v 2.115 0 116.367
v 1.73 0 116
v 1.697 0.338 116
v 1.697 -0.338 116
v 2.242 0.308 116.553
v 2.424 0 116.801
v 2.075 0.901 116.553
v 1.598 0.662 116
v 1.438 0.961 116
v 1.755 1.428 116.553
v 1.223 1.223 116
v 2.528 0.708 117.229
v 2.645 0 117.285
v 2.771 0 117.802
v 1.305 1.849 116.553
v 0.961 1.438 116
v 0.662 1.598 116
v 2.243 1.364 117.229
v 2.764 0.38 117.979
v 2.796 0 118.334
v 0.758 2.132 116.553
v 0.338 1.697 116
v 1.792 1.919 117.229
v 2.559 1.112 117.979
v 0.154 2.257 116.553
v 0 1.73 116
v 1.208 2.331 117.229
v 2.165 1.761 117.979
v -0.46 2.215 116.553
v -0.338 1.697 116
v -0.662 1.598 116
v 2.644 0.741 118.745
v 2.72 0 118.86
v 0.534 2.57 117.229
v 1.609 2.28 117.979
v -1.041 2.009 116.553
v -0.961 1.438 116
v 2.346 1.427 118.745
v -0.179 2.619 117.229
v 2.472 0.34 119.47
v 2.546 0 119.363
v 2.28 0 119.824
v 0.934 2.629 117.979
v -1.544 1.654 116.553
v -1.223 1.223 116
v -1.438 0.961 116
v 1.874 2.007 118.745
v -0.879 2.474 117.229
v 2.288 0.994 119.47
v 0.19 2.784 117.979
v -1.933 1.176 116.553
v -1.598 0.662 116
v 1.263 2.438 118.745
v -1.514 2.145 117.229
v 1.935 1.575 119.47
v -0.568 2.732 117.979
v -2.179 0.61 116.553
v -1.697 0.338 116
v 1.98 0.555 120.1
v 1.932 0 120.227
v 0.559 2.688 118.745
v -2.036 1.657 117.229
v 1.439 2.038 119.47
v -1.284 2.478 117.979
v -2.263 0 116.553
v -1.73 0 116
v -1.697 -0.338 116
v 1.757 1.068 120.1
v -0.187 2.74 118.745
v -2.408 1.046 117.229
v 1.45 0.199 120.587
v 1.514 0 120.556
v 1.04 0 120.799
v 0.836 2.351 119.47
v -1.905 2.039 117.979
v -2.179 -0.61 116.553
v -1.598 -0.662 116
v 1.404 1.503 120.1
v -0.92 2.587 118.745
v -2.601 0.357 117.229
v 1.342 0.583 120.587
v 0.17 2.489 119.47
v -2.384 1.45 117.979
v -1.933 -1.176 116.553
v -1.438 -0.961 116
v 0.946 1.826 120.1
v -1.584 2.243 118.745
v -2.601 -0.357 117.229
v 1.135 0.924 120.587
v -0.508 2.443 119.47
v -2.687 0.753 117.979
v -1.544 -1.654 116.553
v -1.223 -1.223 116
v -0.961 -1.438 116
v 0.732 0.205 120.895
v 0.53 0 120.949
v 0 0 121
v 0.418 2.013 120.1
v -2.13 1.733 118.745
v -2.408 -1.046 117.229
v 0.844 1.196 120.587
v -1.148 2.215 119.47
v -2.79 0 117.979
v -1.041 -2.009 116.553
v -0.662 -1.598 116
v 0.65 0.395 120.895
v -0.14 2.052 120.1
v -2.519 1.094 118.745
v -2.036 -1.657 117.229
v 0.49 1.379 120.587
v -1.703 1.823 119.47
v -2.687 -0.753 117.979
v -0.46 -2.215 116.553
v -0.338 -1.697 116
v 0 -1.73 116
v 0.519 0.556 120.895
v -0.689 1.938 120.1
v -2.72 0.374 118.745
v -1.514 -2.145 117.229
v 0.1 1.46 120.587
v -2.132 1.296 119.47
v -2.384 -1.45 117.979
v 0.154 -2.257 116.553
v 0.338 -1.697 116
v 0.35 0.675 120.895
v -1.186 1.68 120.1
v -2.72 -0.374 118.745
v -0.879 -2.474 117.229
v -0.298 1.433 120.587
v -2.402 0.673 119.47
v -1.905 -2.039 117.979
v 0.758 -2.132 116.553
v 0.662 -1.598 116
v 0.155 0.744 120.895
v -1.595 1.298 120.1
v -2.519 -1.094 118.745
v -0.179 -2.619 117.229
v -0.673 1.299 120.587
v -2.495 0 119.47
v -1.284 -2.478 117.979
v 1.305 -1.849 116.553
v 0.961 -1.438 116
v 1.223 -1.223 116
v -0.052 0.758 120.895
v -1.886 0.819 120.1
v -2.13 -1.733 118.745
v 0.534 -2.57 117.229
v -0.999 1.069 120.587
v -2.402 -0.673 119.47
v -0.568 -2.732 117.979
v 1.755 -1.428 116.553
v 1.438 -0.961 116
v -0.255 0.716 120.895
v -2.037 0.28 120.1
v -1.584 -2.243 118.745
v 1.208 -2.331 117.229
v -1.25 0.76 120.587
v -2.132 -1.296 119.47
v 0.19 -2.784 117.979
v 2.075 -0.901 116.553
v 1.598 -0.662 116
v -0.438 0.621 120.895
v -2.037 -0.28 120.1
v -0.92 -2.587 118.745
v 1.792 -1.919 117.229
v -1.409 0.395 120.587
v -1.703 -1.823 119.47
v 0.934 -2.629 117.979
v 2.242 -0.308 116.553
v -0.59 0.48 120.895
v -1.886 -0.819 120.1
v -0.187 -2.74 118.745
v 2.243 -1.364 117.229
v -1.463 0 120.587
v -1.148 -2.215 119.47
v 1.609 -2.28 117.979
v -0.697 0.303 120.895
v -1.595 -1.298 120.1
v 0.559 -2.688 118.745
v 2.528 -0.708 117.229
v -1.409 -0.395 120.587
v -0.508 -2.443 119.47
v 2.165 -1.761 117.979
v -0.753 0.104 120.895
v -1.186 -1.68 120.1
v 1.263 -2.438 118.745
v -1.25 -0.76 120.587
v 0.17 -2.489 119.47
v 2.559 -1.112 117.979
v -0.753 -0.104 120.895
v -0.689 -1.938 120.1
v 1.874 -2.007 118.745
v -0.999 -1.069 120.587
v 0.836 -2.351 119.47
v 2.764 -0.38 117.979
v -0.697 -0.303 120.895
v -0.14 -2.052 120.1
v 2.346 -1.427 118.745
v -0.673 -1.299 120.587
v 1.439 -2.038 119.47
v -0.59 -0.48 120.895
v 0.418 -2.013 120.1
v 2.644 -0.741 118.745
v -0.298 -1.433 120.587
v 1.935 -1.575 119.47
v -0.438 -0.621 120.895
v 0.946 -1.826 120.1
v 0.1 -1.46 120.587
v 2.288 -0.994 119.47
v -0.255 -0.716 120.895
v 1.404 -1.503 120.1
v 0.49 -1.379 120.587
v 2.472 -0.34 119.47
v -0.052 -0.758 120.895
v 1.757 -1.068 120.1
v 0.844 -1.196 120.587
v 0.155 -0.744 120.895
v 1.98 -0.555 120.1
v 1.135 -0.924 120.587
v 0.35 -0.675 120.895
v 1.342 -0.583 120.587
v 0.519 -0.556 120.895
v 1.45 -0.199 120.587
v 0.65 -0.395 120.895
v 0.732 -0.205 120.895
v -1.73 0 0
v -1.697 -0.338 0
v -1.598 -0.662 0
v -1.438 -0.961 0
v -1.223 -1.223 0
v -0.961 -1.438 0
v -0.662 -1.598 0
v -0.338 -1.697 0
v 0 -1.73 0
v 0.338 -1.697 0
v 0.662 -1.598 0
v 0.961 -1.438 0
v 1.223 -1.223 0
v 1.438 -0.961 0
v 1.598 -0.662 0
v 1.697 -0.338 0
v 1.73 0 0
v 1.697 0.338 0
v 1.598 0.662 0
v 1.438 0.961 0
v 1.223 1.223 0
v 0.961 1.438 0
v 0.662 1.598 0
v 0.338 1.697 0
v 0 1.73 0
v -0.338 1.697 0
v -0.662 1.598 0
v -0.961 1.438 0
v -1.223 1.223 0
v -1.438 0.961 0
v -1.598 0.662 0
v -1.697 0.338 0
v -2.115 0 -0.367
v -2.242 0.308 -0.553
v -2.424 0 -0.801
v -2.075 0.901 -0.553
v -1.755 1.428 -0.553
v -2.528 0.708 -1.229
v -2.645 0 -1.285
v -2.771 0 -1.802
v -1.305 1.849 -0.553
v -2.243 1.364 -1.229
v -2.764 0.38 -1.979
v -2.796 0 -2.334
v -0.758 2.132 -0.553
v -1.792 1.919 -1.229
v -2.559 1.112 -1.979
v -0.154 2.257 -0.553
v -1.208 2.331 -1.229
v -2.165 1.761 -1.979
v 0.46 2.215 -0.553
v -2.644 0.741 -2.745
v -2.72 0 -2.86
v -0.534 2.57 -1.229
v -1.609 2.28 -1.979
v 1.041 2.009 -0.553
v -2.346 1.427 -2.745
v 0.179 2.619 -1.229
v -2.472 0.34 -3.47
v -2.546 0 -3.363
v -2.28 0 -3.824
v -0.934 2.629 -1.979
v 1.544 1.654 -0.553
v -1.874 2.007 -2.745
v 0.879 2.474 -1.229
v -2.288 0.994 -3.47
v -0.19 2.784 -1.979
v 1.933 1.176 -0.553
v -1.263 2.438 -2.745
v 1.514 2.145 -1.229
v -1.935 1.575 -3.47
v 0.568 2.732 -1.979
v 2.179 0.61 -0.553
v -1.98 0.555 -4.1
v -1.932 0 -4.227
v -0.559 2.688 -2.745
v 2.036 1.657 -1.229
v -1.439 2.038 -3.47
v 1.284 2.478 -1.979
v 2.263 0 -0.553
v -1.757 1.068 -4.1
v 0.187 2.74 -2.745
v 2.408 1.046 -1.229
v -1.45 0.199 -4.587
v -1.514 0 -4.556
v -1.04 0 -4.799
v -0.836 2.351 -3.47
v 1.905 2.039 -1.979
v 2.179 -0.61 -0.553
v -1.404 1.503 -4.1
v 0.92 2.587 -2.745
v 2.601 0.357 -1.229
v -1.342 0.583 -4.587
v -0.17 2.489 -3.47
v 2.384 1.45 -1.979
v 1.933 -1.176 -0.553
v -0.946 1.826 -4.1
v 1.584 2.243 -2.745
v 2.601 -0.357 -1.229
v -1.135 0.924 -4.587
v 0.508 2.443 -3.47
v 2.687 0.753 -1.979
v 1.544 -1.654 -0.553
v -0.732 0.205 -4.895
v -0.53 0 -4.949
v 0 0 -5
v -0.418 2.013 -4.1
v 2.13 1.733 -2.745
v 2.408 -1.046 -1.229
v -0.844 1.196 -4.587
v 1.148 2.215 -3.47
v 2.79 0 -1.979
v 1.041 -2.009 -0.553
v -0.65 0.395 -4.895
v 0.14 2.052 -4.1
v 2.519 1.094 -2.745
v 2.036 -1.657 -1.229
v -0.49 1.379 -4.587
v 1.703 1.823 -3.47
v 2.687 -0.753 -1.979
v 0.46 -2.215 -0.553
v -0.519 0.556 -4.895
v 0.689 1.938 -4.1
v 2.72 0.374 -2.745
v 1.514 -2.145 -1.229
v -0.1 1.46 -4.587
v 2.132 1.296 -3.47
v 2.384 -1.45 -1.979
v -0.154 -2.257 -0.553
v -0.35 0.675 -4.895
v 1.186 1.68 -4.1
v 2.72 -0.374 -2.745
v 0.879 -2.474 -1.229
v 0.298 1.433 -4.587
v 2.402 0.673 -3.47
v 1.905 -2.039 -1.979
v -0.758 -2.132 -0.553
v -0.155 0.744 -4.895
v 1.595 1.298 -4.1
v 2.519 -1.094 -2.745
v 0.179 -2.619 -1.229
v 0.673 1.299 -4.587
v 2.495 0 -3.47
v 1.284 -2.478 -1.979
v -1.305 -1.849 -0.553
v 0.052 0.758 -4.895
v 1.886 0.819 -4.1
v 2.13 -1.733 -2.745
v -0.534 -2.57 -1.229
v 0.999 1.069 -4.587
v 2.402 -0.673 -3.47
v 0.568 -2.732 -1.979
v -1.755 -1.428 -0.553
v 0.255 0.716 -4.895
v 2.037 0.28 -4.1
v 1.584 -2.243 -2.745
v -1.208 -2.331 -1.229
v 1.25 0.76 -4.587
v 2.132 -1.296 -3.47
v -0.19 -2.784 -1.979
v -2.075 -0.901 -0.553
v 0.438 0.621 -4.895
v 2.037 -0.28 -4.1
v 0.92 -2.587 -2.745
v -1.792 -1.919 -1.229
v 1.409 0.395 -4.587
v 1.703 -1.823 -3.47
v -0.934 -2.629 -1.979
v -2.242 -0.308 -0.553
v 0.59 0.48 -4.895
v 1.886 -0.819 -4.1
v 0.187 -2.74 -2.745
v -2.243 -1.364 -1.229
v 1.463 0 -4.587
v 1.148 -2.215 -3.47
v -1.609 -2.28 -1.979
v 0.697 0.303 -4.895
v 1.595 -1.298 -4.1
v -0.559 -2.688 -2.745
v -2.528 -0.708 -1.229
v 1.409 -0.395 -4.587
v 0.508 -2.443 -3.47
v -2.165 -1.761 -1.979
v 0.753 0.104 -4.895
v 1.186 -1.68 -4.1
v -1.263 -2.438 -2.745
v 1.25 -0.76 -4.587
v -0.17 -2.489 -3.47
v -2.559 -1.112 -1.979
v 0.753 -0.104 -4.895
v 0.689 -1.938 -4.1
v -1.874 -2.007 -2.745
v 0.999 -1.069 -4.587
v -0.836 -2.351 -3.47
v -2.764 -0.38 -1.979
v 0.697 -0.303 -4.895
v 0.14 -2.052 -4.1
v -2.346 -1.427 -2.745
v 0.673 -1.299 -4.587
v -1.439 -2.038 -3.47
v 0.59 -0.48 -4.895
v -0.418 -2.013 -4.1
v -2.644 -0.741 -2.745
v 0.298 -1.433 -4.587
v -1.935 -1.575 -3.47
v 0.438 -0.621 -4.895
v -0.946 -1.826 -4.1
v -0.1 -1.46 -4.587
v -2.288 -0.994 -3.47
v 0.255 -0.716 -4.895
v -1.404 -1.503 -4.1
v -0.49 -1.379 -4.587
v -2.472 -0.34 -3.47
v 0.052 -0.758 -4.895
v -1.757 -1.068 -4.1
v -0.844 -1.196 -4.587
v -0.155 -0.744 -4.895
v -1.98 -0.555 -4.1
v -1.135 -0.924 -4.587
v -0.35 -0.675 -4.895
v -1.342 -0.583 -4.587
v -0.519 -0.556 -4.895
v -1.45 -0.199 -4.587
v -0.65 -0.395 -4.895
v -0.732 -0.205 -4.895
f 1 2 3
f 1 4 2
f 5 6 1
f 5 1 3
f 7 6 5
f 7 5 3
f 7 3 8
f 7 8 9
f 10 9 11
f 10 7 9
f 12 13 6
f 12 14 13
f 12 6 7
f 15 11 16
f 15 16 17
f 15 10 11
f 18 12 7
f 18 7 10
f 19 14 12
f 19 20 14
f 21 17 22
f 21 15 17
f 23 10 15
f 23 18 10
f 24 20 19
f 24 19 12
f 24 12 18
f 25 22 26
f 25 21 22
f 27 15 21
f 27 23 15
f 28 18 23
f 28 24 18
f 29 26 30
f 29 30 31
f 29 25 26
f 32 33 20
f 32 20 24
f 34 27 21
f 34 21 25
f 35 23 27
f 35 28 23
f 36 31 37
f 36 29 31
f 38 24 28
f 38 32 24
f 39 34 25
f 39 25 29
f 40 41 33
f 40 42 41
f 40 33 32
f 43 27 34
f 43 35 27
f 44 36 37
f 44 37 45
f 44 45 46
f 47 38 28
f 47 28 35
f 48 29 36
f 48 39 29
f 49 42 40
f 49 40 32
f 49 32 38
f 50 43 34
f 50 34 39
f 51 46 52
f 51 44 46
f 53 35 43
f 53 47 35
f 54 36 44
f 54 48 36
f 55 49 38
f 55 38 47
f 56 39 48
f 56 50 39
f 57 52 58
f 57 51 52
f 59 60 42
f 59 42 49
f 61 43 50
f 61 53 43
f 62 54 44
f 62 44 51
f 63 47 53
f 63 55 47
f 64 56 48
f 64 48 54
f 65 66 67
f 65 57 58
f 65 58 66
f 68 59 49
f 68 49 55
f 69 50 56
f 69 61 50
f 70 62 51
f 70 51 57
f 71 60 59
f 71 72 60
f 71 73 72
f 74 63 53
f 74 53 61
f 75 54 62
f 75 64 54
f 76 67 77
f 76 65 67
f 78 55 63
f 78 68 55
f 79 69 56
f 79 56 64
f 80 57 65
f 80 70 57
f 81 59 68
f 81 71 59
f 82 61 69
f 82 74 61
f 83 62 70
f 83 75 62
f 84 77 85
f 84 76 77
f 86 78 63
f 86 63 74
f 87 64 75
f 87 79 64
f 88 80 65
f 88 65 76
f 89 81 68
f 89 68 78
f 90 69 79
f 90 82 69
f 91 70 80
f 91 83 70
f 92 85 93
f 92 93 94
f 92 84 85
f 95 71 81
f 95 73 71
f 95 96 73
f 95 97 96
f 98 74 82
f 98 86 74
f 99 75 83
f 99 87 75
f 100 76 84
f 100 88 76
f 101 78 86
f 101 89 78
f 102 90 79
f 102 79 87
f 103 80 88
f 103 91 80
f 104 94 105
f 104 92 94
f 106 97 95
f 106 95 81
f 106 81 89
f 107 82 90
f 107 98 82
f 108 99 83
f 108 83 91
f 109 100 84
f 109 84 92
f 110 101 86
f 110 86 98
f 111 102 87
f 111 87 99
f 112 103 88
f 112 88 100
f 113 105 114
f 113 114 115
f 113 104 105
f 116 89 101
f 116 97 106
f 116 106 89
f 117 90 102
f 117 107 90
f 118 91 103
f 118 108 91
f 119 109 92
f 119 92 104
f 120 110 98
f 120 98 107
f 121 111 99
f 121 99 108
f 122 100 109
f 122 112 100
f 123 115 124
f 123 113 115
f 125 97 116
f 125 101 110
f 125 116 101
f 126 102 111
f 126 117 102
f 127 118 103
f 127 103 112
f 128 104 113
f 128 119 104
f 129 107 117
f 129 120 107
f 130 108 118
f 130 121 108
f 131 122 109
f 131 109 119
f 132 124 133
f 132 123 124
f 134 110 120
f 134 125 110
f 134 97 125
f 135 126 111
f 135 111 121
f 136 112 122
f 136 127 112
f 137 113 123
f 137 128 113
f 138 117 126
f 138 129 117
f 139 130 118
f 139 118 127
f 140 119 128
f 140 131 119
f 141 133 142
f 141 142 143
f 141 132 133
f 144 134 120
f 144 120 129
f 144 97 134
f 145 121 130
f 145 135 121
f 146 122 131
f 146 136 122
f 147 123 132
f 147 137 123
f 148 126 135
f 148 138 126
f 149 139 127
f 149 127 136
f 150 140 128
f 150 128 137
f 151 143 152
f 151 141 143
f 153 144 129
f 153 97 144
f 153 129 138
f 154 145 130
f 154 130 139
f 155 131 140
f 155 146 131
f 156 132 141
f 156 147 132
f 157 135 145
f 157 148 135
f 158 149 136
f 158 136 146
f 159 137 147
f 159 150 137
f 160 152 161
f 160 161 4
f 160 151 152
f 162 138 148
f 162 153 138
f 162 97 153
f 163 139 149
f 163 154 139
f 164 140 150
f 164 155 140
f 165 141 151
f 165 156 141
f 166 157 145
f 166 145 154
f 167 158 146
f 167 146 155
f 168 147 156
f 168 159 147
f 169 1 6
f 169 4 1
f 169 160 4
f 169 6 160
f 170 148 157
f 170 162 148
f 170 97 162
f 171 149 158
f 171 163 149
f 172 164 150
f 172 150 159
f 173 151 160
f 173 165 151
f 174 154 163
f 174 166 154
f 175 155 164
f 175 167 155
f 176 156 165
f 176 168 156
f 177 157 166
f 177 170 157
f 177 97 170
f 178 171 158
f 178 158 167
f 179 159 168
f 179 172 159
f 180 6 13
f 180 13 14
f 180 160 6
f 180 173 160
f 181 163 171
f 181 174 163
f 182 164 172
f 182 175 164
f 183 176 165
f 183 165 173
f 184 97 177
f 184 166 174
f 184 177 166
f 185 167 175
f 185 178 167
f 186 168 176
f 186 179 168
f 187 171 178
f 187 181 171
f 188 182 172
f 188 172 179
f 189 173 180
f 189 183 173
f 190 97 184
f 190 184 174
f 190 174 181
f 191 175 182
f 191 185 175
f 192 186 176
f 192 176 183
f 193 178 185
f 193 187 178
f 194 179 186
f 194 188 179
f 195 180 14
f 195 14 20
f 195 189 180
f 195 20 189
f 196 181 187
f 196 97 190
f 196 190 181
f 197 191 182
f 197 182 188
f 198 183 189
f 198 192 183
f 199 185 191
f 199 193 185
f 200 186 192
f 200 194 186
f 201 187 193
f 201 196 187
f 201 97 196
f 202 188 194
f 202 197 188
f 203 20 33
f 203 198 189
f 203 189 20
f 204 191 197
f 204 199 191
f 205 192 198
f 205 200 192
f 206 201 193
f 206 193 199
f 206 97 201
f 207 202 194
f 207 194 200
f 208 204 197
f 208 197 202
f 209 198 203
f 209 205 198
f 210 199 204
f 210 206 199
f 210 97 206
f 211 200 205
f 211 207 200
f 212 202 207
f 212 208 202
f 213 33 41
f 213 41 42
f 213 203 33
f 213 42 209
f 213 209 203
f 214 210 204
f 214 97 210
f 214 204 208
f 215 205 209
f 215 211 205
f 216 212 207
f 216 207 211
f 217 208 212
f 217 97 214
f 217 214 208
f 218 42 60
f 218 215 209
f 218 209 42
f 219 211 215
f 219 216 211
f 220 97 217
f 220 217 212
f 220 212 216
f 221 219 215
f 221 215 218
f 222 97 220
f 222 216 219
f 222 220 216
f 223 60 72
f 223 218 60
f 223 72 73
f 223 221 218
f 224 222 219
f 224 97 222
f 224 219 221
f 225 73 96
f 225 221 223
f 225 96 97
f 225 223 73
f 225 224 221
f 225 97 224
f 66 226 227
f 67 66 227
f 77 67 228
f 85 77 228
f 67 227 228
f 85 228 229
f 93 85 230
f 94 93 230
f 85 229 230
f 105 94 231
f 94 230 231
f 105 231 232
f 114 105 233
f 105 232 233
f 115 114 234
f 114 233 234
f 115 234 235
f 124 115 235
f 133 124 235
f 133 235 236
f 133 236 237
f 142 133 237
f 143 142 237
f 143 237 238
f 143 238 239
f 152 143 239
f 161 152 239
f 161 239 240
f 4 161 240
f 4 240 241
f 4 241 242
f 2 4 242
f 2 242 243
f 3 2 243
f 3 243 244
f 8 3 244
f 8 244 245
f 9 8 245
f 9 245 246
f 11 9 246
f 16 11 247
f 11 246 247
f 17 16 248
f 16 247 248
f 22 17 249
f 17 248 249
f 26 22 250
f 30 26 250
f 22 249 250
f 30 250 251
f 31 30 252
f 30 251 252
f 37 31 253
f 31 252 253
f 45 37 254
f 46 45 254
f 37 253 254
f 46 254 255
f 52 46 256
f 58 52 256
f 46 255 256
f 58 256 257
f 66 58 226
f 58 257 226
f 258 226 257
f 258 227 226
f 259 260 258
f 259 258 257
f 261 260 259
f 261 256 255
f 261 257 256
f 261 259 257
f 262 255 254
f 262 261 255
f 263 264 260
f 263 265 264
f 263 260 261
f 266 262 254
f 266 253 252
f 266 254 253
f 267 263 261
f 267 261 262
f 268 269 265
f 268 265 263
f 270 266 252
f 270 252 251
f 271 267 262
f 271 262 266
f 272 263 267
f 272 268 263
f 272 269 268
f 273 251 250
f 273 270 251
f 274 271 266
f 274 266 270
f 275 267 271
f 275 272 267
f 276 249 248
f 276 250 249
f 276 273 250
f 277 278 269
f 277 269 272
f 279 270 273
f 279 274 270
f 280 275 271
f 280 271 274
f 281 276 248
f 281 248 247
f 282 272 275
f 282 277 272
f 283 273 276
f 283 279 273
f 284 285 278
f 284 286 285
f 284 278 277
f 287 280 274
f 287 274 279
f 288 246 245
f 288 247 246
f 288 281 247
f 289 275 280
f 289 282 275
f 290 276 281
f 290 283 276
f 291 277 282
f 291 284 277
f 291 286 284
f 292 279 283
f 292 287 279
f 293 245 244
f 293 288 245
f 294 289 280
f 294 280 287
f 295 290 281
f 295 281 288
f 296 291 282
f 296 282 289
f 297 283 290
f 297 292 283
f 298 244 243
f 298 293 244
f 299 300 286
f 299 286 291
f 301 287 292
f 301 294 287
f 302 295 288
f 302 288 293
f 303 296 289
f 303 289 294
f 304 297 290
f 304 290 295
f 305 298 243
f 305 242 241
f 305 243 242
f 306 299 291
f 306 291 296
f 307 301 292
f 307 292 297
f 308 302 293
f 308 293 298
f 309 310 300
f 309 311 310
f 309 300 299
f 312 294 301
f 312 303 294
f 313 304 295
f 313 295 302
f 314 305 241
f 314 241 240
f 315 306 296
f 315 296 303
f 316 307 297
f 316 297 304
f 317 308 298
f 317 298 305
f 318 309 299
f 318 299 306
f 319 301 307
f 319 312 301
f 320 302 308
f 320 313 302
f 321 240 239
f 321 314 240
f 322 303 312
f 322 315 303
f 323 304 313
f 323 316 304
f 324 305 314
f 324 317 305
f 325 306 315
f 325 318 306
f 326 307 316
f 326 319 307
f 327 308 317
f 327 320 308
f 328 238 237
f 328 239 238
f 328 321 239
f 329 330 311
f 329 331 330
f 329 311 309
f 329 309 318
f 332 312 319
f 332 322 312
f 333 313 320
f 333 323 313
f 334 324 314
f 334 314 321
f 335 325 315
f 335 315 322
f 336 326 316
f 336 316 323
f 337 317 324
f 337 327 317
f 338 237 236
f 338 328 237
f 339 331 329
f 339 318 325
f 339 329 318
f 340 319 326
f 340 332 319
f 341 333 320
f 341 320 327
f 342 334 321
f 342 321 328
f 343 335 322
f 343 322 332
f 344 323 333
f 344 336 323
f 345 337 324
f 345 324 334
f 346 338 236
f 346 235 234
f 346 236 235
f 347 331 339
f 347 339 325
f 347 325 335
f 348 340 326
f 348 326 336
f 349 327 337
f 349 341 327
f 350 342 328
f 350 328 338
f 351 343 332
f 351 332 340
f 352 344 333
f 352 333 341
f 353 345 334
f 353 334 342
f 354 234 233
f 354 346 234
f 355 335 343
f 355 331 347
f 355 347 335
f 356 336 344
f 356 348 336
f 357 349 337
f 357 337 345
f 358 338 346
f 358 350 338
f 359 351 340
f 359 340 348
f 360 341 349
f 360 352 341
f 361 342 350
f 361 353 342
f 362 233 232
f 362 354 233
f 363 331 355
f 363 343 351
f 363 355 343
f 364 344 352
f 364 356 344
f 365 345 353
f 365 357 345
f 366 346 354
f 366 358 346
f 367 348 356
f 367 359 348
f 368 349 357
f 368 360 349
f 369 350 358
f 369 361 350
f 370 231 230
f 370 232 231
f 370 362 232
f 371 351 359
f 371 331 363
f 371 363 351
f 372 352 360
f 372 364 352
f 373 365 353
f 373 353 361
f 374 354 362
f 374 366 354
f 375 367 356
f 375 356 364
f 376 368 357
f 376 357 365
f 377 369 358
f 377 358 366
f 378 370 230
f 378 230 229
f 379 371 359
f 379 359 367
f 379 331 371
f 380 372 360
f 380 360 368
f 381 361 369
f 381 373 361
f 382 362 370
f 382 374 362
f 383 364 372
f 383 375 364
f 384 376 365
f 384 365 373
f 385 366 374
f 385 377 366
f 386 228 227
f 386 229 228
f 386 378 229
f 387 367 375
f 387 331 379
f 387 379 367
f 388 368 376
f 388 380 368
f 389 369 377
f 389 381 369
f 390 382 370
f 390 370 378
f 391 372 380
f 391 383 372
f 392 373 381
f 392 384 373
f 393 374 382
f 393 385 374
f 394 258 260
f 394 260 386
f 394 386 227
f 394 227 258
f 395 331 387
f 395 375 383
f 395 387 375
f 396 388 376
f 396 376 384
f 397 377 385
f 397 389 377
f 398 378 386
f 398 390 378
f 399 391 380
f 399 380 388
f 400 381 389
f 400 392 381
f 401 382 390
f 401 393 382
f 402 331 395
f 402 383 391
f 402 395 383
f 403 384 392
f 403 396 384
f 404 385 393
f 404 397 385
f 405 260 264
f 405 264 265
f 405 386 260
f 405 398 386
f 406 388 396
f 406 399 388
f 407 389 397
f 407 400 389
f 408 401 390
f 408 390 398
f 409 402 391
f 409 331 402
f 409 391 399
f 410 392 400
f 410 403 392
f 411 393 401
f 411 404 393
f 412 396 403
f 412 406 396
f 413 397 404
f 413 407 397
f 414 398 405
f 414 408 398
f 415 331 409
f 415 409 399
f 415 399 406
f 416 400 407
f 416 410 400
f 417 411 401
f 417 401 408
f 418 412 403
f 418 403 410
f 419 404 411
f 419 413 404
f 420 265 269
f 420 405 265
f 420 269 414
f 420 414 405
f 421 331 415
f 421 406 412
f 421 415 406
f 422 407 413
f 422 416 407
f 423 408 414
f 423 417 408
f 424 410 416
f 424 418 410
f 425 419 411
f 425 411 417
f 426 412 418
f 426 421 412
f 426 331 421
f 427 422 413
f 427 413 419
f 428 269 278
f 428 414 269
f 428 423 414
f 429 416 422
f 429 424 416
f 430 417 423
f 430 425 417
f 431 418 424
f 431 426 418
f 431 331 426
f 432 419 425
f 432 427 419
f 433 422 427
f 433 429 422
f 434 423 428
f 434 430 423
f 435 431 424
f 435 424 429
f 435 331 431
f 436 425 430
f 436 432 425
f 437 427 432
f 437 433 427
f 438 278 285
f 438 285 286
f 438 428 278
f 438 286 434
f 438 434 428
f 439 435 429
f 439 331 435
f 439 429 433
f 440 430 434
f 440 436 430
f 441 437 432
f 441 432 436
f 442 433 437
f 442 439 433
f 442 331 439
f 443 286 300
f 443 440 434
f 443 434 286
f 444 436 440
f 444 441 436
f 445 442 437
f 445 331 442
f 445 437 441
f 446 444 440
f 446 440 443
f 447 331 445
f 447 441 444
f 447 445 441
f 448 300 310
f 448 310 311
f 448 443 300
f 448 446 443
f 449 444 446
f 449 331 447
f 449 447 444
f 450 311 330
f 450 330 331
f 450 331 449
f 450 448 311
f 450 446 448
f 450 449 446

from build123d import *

# Parameters (mm, degrees)
SKETCH1_R           = 1.73
BOSS_EXTRUDE1_DEPTH = 116
DOME1_FACE_RADIUS   = 1.73
DOME1_HEIGHT        = 5
DOME2_FACE_RADIUS   = 1.73
DOME2_HEIGHT        = 5


with BuildPart() as part:
    # Sketch1 → Boss-Extrude1 (new body)
    with BuildSketch(Plane.XY):
        with Locations(Location((0, 0, 0), (0, 0, 180))):
            Circle(SKETCH1_R)
    extrude(amount=BOSS_EXTRUDE1_DEPTH)

    # Dome1: a dome of height H over a round flat face of radius A is a cap of a sphere of radius (A * A + H * H) / (2 * H)
    dome1_r = (DOME1_FACE_RADIUS * DOME1_FACE_RADIUS + DOME1_HEIGHT * DOME1_HEIGHT) / (2 * DOME1_HEIGHT)
    dome1_base = Plane((0, 0, 0), z_dir=(0, 0, -1))
    with Locations(dome1_base.offset(DOME1_HEIGHT - dome1_r)):
        dome1_ball = Sphere(dome1_r, mode=Mode.PRIVATE)
    add(split(dome1_ball, bisect_by=dome1_base, keep=Keep.TOP, mode=Mode.PRIVATE))

    # Dome2: a dome of height H over a round flat face of radius A is a cap of a sphere of radius (A * A + H * H) / (2 * H)
    dome2_r = (DOME2_FACE_RADIUS * DOME2_FACE_RADIUS + DOME2_HEIGHT * DOME2_HEIGHT) / (2 * DOME2_HEIGHT)
    dome2_base = Plane((0, 0, 116), z_dir=(0, 0, 1))
    with Locations(dome2_base.offset(DOME2_HEIGHT - dome2_r)):
        dome2_ball = Sphere(dome2_r, mode=Mode.PRIVATE)
    add(split(dome2_ball, bisect_by=dome2_base, keep=Keep.TOP, mode=Mode.PRIVATE))


solid = part.part
